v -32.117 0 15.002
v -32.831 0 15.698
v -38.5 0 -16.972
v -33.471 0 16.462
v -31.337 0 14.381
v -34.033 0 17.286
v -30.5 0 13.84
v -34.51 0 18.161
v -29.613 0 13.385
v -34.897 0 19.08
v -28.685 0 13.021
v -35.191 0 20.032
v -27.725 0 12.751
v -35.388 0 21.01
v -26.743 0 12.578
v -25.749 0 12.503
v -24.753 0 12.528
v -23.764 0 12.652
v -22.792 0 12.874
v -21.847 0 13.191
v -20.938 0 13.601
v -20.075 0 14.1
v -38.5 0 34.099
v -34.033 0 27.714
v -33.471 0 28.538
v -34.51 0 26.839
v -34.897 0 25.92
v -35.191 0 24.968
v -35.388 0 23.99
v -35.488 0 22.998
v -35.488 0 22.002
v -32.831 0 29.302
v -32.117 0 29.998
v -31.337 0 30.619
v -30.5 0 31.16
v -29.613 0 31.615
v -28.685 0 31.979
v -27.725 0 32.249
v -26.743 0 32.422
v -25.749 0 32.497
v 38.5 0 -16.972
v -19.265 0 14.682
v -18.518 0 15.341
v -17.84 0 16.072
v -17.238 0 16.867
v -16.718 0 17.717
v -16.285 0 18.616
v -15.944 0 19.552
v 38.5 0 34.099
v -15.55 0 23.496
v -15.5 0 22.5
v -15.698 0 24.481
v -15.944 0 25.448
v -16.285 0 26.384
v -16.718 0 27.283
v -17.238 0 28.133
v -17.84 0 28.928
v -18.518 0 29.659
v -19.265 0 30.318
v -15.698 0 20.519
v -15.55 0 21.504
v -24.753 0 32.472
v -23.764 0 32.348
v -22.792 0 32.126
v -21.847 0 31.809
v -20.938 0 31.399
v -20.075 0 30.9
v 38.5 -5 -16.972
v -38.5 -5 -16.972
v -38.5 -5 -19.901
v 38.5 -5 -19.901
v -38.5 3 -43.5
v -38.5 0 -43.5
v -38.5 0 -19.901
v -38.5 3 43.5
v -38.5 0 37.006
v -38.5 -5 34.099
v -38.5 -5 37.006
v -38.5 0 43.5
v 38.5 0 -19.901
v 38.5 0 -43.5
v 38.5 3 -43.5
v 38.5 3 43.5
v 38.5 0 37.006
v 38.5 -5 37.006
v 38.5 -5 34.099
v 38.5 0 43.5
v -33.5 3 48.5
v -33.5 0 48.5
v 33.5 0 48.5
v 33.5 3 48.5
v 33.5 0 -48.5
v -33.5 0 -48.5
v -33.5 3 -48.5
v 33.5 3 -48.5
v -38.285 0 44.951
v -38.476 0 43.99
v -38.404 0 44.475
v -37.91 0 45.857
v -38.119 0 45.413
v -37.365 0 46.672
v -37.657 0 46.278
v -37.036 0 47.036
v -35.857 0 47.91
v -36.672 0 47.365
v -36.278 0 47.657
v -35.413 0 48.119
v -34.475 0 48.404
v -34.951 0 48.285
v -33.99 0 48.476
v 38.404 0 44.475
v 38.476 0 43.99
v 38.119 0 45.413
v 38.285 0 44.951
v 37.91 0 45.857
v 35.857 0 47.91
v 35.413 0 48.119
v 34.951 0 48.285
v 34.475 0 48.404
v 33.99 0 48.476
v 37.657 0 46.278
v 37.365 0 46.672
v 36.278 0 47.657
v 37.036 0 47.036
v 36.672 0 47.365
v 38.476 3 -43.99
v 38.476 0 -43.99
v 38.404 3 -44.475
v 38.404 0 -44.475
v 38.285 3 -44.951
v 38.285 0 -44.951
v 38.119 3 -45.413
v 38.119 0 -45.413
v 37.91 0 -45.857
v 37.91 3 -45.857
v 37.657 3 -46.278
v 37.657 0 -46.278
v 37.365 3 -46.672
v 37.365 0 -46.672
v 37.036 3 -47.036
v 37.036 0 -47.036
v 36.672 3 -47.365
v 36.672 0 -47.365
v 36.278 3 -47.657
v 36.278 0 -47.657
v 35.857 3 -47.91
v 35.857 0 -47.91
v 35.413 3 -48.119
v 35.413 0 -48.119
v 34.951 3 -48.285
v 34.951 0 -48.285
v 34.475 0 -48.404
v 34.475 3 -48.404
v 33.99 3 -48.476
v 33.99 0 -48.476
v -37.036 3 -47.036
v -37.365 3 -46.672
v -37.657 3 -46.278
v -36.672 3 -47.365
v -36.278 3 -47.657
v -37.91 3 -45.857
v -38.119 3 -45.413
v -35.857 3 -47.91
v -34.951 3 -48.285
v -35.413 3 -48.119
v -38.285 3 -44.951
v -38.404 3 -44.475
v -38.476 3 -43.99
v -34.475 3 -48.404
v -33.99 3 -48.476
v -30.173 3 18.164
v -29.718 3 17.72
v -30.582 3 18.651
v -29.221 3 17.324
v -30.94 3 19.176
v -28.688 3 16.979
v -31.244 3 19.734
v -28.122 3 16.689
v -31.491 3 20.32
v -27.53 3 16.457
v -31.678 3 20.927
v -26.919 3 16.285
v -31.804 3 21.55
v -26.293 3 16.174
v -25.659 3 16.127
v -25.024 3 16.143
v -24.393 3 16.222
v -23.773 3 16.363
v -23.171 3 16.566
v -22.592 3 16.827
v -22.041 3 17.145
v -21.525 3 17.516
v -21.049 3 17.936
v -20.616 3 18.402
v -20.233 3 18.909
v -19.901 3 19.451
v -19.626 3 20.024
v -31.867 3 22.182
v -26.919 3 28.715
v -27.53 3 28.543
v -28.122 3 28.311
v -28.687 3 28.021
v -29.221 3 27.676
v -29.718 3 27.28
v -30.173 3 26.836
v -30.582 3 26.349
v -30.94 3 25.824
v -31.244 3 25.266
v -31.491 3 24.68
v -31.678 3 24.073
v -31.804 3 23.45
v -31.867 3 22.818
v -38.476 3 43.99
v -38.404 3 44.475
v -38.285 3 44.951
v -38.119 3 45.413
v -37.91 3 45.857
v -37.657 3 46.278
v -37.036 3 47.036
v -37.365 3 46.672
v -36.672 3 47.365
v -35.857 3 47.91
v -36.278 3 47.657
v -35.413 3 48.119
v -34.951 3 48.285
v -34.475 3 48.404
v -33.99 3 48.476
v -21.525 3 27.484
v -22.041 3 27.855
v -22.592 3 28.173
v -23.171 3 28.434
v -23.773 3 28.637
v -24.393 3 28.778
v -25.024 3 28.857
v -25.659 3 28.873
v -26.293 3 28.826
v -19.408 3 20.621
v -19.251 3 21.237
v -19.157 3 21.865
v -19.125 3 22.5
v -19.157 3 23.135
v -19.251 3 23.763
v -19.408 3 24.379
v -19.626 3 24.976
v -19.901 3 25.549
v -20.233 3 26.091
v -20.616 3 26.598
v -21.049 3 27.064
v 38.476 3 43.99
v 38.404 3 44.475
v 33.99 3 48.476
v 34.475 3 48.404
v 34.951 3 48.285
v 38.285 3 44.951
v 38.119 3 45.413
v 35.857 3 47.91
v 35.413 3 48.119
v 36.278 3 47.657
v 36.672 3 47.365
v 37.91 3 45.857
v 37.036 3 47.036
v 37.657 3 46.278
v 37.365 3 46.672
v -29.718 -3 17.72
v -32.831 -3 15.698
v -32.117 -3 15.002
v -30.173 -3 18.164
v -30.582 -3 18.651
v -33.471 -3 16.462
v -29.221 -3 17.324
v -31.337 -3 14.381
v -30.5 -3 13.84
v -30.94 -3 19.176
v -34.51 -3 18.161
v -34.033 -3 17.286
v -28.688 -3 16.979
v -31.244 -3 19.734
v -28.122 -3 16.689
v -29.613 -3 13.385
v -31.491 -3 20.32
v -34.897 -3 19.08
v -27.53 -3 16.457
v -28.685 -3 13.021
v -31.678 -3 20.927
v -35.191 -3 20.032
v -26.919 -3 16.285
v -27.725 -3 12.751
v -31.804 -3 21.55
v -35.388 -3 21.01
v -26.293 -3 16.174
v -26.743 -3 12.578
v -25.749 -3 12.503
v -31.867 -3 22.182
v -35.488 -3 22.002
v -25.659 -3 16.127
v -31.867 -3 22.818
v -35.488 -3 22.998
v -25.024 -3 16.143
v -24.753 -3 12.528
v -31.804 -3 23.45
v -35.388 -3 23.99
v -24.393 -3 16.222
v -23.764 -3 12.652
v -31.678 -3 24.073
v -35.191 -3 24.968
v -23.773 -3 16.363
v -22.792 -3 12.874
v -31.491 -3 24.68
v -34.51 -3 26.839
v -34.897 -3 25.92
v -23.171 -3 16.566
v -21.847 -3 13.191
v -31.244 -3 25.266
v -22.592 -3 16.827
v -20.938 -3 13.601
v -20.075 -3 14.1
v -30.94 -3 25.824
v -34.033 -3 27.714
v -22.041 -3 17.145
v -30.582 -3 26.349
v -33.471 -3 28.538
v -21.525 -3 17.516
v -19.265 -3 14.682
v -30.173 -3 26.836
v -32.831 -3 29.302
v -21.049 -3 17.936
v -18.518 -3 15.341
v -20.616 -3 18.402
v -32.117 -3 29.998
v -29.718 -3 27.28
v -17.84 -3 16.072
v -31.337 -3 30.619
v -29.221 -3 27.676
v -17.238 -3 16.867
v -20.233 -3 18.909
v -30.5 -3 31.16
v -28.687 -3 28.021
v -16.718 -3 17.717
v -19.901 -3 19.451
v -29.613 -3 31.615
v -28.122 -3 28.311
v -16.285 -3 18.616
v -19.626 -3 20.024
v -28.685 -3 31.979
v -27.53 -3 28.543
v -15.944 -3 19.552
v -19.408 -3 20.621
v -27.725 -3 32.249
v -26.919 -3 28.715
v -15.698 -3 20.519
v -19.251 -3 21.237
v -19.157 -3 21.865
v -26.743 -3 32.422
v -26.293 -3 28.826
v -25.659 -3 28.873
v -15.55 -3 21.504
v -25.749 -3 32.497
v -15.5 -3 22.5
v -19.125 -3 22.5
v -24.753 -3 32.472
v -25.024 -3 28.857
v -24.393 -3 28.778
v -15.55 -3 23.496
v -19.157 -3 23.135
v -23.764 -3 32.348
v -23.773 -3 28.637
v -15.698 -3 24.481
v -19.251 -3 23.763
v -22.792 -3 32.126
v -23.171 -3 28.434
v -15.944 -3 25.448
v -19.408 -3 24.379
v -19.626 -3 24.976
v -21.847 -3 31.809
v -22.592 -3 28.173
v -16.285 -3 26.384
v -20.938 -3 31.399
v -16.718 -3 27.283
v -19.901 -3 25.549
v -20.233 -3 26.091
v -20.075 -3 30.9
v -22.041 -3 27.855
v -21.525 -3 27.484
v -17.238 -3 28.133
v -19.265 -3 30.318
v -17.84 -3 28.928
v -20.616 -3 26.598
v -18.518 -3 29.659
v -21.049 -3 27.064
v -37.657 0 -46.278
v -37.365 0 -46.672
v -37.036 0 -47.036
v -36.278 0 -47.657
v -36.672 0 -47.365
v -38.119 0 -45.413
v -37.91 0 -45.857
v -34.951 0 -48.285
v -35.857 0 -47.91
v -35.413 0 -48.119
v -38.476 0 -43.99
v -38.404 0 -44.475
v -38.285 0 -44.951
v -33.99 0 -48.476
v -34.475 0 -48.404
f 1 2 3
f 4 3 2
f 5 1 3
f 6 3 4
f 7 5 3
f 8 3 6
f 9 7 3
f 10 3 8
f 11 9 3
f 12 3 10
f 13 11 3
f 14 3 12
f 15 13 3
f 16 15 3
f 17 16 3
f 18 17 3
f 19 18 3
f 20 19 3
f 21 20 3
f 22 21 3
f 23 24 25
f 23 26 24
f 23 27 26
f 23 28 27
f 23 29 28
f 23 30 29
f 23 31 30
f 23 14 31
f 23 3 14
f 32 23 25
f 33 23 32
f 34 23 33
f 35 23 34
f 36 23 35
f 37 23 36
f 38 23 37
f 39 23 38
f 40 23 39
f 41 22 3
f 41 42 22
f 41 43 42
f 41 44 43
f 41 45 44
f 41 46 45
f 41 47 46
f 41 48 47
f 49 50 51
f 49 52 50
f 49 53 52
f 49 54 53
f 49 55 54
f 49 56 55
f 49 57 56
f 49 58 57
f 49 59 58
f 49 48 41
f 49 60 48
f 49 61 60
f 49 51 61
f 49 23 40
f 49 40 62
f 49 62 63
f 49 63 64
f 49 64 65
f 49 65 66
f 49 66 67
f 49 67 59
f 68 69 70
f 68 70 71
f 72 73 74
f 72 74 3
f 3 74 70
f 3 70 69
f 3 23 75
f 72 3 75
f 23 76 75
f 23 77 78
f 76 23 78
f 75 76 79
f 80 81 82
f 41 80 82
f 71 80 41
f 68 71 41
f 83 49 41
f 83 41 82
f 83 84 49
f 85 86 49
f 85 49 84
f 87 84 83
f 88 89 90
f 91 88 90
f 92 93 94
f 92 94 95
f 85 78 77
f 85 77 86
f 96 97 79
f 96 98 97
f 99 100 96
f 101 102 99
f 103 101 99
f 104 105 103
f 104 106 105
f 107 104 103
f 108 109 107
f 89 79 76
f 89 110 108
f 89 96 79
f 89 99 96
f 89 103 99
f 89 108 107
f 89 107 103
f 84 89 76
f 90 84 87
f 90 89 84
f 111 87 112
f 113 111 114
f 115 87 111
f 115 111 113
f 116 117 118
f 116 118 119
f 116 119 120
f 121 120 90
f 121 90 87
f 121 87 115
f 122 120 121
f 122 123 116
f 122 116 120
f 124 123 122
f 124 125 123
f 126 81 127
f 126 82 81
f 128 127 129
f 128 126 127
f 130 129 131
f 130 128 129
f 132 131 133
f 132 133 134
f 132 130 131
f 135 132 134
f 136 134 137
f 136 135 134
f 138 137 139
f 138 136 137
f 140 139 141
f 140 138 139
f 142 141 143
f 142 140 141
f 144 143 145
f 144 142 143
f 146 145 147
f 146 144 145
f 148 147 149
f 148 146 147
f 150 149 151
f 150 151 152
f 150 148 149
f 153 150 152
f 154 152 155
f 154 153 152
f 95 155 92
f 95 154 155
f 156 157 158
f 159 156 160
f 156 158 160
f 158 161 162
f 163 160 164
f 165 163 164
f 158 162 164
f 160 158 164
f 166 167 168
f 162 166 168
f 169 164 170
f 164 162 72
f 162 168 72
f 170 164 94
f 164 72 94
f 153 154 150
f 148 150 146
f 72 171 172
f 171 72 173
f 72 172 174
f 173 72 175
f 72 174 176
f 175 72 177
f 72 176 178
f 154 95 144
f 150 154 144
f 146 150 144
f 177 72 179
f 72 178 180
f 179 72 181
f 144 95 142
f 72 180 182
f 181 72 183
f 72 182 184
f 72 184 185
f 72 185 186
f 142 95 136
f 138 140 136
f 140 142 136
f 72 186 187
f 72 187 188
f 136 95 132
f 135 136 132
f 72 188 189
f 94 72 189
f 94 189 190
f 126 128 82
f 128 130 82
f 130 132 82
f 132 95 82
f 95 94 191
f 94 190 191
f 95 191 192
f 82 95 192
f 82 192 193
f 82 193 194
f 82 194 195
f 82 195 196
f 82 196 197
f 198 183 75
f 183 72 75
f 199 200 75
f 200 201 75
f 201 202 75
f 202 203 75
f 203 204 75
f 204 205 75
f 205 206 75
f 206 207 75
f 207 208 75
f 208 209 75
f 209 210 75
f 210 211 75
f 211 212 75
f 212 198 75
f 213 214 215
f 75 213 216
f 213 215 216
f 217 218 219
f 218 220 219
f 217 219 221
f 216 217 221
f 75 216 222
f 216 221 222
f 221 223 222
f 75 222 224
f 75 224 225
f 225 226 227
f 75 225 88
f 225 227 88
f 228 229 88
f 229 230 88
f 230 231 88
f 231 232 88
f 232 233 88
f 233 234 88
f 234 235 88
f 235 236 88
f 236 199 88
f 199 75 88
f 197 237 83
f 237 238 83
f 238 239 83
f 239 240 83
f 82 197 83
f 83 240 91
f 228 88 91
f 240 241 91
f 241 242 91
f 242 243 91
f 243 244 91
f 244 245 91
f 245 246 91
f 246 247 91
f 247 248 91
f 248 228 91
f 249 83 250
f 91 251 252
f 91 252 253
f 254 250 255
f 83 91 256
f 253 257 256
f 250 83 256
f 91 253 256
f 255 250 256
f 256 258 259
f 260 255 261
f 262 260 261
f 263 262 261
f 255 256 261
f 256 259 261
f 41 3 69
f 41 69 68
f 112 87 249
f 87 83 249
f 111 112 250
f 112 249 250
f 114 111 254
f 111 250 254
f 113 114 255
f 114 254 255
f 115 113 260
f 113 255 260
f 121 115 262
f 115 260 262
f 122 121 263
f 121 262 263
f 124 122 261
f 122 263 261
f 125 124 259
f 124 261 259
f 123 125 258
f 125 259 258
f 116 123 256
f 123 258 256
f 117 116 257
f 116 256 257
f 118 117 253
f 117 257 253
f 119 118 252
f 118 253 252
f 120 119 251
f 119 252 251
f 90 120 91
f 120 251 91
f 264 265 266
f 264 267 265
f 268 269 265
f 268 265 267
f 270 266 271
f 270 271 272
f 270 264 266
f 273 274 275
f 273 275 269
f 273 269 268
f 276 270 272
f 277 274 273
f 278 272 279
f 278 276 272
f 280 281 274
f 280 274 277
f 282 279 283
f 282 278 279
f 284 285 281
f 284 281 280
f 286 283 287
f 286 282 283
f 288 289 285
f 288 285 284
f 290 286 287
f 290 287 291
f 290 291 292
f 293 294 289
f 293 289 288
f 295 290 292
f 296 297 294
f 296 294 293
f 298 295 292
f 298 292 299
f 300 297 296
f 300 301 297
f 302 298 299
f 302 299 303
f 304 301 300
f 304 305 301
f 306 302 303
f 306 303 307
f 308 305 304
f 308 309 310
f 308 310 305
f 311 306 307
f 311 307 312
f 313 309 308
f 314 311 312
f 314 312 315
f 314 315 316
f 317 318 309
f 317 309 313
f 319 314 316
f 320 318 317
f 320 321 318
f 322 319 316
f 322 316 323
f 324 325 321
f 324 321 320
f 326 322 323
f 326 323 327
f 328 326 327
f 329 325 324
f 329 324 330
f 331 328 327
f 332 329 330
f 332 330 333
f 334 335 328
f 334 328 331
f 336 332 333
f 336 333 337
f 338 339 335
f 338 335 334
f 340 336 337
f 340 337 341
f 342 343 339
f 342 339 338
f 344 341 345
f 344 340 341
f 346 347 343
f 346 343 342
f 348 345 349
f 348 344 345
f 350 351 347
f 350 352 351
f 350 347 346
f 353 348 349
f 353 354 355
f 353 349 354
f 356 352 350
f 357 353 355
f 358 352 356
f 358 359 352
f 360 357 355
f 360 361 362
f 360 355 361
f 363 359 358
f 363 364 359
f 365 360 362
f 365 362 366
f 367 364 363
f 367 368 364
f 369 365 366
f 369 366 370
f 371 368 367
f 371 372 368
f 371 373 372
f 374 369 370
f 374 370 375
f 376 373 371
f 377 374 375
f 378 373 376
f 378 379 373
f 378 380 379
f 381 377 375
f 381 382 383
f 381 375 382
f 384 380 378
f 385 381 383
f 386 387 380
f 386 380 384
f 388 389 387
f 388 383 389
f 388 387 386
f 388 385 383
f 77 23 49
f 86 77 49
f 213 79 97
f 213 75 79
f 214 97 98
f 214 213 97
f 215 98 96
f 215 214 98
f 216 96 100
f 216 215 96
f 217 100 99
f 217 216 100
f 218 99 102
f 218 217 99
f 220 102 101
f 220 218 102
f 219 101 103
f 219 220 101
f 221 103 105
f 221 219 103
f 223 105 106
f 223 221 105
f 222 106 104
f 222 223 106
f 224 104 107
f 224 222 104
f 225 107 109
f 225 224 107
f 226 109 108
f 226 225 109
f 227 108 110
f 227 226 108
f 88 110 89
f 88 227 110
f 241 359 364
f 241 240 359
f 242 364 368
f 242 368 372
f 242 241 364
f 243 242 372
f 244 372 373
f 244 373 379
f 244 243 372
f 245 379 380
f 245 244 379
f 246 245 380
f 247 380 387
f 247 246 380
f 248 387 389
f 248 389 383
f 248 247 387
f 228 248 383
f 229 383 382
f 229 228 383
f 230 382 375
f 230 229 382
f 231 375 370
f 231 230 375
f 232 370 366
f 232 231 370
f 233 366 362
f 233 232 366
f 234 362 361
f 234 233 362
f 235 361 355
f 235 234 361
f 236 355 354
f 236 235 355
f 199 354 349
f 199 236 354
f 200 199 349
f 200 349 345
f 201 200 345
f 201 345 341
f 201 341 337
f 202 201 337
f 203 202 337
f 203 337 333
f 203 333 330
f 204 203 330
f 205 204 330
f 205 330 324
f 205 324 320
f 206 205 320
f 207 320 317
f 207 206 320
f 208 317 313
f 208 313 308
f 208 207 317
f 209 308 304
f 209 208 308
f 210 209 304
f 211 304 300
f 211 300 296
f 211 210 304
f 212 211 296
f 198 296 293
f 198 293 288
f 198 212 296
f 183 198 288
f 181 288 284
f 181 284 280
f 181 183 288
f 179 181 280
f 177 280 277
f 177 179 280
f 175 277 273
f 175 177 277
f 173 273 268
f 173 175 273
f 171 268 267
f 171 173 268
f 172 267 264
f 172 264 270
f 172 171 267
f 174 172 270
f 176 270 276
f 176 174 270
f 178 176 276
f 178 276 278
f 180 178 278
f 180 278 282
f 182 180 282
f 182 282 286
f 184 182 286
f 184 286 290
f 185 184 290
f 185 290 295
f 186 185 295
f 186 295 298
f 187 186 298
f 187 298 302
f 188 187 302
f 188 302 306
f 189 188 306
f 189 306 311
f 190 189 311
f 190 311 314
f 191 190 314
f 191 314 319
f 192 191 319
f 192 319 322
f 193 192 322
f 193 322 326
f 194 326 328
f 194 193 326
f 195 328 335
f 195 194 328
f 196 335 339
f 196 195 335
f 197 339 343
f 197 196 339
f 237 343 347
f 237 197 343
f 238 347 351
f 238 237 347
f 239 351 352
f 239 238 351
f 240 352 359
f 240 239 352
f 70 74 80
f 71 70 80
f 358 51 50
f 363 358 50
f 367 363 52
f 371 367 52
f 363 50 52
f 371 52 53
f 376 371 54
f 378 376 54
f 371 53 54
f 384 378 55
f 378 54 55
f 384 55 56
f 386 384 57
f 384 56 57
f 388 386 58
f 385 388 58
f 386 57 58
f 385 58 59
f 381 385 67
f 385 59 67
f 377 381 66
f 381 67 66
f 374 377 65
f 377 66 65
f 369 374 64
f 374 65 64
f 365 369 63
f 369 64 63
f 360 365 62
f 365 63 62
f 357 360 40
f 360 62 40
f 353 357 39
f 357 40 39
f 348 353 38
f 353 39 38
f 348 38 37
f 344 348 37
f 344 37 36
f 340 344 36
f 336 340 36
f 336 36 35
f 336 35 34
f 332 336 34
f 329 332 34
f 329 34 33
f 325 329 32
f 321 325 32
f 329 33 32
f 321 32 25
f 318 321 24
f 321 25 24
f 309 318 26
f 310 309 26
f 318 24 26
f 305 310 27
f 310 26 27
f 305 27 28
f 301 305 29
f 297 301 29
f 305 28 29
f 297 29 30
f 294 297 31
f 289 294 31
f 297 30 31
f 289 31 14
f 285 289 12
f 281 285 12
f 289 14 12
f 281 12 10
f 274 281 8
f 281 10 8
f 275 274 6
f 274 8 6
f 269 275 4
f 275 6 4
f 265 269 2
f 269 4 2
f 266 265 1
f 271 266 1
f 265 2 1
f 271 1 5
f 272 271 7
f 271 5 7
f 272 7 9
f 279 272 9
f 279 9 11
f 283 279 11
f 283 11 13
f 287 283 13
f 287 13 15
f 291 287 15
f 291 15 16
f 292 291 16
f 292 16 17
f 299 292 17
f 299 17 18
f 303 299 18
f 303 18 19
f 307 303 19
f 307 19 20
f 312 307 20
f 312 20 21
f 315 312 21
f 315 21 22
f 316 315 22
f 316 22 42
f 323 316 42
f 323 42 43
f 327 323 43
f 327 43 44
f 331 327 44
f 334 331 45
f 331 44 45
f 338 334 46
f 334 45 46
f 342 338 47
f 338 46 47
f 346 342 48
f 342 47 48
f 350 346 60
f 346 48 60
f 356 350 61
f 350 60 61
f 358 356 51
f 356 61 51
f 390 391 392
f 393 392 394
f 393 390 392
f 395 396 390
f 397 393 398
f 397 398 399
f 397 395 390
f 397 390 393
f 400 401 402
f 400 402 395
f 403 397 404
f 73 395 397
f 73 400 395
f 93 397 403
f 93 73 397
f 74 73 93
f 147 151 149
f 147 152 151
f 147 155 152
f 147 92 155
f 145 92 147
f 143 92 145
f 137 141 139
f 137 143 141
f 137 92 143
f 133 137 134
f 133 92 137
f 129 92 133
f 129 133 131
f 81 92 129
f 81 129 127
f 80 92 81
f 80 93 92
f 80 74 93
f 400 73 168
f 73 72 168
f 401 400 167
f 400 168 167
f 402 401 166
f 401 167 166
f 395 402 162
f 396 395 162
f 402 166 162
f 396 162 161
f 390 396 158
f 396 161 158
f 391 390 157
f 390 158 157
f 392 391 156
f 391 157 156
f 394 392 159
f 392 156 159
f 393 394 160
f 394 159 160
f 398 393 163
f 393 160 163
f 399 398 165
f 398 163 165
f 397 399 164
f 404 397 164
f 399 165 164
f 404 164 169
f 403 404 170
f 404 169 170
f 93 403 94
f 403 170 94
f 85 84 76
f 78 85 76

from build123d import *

# Parameters (mm, degrees)
F0_W     = 77
F0_H     = 97
F0_R     = 6.375
F1_DEPTH = 3
F2_R     = 10
F2_R_2   = 6.375
F3_DEPTH = 3
F4_W     = 77
F4_H     = 2.929018
F5_DEPTH = 5
F6_R     = 5


with BuildPart() as f1:
    # F0 (on Front) → F1 (new body)
    with BuildSketch(Plane.XZ):
        Rectangle(F0_W, F0_H)
        with Locations((-25.5, 22.5)):
            Circle(F0_R, mode=Mode.SUBTRACT)
    extrude(amount=-F1_DEPTH)

    # F2 (on face) → F3 (join)
    with BuildSketch(Plane.XZ):
        with Locations((-25.5, 22.5)):
            Circle(F2_R)
        with Locations((-25.5, 22.5)):
            Circle(F2_R_2, mode=Mode.SUBTRACT)
    extrude(amount=F3_DEPTH)

    # F4 (on face) → F5 (join)
    with BuildSketch(Plane.XZ):
        Polygon((-38.5, 37.005685), (-38.5, 35.700995), (-38.5, 34.099021), (38.5, 34.099021), (38.5, 35.700995), (38.5, 37.005685), align=None)
        with Locations((0, -18.43647)):
            Rectangle(F4_W, F4_H)
    extrude(amount=F5_DEPTH)

    # F6
    f6_edges = [f1.edges().sort_by_distance(p)[0] for p in [
        (38.5, 1.5, 48.5),
        (-38.5, 1.5, 48.5),
        (38.5, 1.5, -48.5),
        (-38.5, 1.5, -48.5),
    ]]
    fillet(f6_edges, radius=F6_R)


solid = f1.part
